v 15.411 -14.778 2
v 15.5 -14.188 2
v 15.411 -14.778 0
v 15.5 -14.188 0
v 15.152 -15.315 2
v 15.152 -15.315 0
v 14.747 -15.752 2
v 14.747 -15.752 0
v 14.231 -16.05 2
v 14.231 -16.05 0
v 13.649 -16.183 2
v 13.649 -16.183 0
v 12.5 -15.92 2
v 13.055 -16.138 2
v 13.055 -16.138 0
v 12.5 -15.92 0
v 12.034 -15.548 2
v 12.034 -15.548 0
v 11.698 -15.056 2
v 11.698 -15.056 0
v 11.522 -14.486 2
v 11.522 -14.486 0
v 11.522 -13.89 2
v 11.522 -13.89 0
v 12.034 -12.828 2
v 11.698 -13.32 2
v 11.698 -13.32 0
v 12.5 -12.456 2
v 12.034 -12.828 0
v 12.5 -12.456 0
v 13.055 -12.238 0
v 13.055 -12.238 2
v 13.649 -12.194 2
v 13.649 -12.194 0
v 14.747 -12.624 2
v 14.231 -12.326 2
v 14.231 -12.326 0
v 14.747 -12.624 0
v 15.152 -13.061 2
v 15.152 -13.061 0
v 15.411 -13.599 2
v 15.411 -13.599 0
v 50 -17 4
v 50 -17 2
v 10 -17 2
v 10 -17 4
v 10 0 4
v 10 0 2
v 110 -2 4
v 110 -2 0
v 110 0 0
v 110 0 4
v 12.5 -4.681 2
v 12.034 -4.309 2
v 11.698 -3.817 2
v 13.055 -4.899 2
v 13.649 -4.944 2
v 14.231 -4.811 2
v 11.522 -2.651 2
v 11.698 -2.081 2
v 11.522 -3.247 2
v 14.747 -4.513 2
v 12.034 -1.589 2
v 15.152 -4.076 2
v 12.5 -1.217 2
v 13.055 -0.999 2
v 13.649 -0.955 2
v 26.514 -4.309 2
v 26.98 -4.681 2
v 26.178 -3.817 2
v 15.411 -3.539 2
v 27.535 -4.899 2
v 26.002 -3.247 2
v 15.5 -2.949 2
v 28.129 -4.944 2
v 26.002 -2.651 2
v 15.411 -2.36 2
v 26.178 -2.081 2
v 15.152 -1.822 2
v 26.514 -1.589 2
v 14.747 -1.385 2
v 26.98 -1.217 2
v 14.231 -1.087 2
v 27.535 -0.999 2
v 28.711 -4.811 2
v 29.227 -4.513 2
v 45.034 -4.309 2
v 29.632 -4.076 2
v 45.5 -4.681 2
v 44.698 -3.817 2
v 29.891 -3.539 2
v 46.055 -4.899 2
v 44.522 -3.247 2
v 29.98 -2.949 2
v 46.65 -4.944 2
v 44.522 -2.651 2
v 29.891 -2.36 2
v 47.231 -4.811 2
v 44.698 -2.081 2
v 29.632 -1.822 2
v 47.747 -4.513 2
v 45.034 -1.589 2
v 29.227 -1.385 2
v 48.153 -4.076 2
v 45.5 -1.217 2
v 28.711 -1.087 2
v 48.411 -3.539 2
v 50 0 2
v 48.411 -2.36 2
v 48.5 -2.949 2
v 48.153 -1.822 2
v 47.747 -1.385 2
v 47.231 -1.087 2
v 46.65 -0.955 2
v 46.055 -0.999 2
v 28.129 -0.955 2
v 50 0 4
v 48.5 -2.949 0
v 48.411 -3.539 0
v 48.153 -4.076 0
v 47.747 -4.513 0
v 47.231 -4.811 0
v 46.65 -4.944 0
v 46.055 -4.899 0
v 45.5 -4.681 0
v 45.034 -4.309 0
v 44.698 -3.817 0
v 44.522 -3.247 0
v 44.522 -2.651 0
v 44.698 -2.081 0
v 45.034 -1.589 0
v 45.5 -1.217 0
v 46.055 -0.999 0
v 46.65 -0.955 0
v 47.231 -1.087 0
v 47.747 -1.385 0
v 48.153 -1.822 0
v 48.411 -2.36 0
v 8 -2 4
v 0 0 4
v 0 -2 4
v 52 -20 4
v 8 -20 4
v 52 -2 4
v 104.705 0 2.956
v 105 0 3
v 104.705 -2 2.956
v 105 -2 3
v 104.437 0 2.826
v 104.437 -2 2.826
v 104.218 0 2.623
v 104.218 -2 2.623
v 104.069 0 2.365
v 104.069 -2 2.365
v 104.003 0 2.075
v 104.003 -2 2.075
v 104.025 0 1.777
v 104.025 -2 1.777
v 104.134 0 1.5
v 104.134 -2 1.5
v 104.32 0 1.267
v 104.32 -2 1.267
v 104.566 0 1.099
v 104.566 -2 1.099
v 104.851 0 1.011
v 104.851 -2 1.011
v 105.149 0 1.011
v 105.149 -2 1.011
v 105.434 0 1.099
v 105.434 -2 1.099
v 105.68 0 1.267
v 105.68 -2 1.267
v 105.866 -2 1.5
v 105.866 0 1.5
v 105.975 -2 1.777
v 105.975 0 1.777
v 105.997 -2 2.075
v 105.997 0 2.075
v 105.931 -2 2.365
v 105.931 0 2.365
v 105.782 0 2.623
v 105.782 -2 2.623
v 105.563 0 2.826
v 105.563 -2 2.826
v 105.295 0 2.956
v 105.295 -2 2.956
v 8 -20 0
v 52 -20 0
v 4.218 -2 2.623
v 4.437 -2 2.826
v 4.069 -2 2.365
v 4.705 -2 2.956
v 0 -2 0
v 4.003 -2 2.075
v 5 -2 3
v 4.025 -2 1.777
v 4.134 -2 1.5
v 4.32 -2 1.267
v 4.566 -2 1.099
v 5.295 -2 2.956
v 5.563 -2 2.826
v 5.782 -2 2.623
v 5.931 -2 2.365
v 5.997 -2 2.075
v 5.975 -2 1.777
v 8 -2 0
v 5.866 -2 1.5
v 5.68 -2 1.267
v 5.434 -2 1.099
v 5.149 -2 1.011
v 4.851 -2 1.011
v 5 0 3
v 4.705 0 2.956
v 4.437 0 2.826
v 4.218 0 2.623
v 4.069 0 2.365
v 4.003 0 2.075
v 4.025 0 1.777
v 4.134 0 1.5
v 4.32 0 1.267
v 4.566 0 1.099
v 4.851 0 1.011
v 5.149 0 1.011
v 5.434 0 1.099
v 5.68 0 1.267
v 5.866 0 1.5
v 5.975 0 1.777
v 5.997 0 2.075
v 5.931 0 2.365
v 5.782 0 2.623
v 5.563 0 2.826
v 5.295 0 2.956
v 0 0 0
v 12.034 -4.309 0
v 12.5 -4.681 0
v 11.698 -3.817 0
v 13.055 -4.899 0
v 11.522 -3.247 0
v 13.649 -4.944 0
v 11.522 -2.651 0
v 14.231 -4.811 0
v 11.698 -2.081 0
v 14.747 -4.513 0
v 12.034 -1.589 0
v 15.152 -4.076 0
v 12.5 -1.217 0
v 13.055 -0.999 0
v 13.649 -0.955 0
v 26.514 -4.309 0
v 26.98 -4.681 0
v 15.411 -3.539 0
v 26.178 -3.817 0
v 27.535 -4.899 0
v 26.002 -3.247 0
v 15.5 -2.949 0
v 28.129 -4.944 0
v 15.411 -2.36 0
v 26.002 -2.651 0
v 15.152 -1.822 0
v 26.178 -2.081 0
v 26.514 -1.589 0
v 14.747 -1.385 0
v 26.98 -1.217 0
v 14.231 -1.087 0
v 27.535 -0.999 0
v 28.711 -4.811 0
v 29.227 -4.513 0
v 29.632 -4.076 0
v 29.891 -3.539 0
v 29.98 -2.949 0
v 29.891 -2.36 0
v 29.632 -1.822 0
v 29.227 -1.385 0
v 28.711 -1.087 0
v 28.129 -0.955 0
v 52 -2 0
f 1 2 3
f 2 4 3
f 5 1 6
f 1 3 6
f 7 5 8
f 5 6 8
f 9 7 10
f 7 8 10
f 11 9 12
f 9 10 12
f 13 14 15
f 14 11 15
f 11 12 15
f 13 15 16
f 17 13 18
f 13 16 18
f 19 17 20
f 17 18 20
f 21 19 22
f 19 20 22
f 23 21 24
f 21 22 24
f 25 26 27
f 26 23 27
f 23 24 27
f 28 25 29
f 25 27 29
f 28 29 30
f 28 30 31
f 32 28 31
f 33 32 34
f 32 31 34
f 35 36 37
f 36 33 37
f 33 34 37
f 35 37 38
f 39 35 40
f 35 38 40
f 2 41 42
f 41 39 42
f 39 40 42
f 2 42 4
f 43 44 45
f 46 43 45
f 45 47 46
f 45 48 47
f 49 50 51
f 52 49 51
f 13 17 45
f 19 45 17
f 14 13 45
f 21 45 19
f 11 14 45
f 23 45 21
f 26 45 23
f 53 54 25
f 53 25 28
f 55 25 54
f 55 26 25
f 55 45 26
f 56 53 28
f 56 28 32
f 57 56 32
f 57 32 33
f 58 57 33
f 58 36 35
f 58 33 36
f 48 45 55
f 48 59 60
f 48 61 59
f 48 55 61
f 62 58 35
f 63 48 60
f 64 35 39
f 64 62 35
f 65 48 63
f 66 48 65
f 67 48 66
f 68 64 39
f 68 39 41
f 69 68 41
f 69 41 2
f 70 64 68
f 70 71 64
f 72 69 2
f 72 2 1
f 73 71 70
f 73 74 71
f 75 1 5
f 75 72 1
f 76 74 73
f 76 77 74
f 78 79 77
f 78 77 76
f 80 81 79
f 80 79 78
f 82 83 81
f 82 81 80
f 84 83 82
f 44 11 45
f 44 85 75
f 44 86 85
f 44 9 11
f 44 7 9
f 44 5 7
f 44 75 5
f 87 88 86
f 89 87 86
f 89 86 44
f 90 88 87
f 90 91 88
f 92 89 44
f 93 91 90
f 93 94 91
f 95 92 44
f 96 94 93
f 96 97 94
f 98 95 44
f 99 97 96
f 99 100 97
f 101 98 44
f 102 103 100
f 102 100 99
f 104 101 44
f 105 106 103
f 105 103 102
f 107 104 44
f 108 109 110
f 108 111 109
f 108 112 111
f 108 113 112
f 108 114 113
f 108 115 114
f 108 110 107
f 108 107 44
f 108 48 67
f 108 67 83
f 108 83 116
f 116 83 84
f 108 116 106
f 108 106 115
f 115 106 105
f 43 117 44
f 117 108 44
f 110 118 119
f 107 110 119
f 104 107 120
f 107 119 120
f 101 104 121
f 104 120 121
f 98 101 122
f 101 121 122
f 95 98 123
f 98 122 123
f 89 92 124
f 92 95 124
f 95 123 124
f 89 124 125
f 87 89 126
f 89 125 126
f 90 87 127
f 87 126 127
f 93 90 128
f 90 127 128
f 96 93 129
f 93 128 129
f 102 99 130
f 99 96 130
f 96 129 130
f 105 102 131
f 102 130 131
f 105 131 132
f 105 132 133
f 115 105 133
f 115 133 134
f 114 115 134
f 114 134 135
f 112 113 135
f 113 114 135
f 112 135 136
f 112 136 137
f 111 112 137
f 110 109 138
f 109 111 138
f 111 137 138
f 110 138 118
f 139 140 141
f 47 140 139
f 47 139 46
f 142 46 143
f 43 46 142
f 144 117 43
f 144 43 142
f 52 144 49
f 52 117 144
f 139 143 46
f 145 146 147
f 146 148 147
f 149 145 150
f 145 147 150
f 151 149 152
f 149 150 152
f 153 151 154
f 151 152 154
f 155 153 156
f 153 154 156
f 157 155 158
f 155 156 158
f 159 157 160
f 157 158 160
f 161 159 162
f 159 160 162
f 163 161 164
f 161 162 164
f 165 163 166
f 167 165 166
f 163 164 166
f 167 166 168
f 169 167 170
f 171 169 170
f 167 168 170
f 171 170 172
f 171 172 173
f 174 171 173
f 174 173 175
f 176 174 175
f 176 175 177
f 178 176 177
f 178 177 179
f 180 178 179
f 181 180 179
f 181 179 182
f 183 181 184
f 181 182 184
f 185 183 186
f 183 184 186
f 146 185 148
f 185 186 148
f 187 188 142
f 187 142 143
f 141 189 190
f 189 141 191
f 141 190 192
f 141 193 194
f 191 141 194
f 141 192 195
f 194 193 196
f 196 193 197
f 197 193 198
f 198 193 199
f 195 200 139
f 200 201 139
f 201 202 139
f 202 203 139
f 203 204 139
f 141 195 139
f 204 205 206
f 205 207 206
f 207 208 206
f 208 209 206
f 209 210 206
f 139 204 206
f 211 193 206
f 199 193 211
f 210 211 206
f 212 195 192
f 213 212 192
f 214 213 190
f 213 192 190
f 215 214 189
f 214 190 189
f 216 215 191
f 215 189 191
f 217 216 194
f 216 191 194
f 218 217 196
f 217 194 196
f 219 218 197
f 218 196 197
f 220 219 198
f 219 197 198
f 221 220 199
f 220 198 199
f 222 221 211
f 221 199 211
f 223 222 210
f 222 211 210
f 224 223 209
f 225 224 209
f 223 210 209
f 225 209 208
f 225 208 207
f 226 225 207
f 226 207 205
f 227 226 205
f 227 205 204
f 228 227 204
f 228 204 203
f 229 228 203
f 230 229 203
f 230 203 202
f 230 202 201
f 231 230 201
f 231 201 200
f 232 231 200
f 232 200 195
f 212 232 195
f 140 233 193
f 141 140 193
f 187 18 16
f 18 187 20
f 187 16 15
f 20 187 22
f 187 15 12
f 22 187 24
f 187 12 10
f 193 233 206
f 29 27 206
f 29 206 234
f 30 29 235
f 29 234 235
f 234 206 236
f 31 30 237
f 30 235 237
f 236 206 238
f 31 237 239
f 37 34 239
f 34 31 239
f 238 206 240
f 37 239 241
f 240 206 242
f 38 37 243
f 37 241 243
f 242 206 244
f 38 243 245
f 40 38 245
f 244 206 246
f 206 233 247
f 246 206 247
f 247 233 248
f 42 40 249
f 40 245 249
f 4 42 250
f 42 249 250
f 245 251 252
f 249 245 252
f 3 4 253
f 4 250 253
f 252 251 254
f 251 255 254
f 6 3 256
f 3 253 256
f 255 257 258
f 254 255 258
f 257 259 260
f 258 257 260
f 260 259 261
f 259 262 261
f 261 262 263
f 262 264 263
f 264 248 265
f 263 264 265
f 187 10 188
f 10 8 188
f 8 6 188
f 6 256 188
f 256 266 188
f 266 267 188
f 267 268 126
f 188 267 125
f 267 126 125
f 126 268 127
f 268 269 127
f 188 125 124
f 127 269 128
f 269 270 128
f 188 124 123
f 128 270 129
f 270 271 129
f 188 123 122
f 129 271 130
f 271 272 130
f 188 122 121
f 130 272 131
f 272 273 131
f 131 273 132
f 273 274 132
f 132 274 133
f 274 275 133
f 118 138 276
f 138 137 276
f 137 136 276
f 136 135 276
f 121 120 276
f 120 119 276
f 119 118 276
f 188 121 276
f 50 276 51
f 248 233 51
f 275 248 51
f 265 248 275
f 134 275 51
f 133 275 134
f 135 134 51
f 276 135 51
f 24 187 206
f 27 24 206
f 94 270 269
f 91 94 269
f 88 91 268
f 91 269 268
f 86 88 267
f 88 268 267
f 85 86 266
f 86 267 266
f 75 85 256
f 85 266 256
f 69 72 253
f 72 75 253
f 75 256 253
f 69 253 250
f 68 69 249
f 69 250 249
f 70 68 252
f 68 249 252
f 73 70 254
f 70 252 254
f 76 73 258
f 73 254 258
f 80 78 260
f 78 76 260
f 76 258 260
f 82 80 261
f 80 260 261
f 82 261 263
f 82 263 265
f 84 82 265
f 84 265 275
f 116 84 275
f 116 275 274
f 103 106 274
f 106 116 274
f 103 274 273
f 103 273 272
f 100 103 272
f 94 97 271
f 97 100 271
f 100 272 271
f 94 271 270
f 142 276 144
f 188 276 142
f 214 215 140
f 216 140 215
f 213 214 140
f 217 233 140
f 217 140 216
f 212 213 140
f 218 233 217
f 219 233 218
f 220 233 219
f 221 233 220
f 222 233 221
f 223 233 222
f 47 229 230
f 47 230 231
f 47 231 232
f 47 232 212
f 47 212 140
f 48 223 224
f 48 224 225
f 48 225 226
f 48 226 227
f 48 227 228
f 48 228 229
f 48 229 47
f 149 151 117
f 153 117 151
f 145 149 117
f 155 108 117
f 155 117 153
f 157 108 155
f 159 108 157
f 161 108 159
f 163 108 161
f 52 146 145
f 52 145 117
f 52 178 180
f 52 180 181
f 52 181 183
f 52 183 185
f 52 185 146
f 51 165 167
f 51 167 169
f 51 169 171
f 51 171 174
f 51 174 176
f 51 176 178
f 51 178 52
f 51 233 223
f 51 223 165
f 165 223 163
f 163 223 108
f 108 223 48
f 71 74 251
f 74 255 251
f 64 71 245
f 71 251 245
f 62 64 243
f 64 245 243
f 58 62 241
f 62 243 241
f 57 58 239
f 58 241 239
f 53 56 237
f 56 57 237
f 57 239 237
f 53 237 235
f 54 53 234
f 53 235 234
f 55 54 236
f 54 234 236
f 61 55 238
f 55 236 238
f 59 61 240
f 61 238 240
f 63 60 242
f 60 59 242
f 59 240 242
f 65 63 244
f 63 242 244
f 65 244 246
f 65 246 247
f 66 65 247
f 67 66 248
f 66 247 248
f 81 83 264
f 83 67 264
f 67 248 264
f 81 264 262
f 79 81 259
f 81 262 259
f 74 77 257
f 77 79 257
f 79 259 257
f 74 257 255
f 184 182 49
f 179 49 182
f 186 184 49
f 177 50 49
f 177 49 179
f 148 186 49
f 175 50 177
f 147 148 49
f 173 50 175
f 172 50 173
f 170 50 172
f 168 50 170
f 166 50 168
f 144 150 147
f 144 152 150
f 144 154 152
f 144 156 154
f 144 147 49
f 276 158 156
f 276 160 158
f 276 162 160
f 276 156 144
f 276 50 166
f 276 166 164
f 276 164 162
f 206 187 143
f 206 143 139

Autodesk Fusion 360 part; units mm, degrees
sketch "Esboço1" plane through (0, 0, 0) normal (0, 0, 1) x (1, 0, 0)
  line L0 (0, 0) -> (110, 0)
  line L1 (110, 0) -> (110, -5)
  line L2 (55, -20) -> (5, -20)
  line L3 (0, -5) -> (0, 0)
  line L4 (0, 0) -> (55, 0)
  line L5 (0, -5) -> (0, 0)
  line L6 (35, 0) -> (75, 0)
  line L7 (0, 0) -> (10, 0)
  line L8 (10, 0) -> (10, -10)
  line L9 (0, -5) -> (0, 0)
  line L10 (10, 0) -> (50, 0)
  line L11 (50, 0) -> (50, -17)
  line L12 (50, -17) -> (10, -17)
  line L13 (10, -17) -> (10, 0)
  line L14 (10, 0) -> (50, 0)
  line L15 (50, 0) -> (50, -17)
  line L16 (50, -17) -> (10, -17)
  line L17 (10, -17) -> (10, 0)
  circle A0 centre (46.5001, -2.9491) radius 2
  circle A1 centre (46.5001, -14.1881) radius 2
  circle A2 centre (30, -14.1881) radius 2
  line L18 (30, -12.1881) -> (30, -17)
  circle A3 centre (13.4999, -14.1881) radius 2
  line L19 (0, 0) -> (5, 0)
  line L20 (0, -5) -> (0, 0)
  line L21 (110, 0) -> (105, 0)
  line L22 (110, -5) -> (110, 0)
  line L23 (55, -20) -> (110, -5)
  line L24 (5, -20) -> (0, -5)
  line L25 (0, 0) -> (5, 0)
  line L26 (5, 0) -> (5, 5)
  line L27 (5, 5) -> (0, 5)
  line L28 (0, 5) -> (0, 0)
  line L29 (105, 0) -> (110, 0)
  line L30 (110, 0) -> (110, 5)
  line L31 (110, 5) -> (105, 5)
  line L32 (105, 5) -> (105, 0)
  dimension "d1" = 110
  dimension "d3" = 55
  dimension "d5" = 40
  dimension "d7" = 40
  dimension "d8" = 17
  dimension "d9" = 40
  dimension "d10" = 17
  dimension "d11" = 4
  dimension "d12" = 4
  dimension "d13" = 4
  dimension "d14" = 5
  dimension "d15" = 5
  dimension "d16" = 5
  dimension "d17" = 5
extrude "Extrusão1" add sketch "Esboço1" along normal blind 2 contours L0 L4 L6 L8 L10 L11 L12 L13 L14 L15 L16 L17
extrude "Extrusão2" add sketch "Esboço1" along normal blind 4 contours L0 L1 L2 L3 L4 L5 L6 L7 L8 L9 L11 L12 L13 L15 L16 L17 L19 L20 L21 L22 L23 L24 L25 L29
extrude "Extrusão3" add sketch "Esboço1" along normal blind 1 contours L0 L21 L29 L30 L31 L32
extrude "Extrusão4" add sketch "Esboço1" along normal blind 1 contours L0 L4 L7 L19 L25 L26 L27 L28
sketch "Esboço2" plane through (0, 5, 0) normal (0, 1, 0) x (-1, 0, 0)
  line L0 (-110, 0) -> (-105, 0)
  line L1 (-105, 0) -> (-105, 1)
  line L2 (-105, 1) -> (-110, 1)
  line L3 (-110, 1) -> (-110, 0)
  circle A0 centre (-105, 2) radius 1
  circle A1 centre (-5, 2) radius 1
  dimension "d26" = 2
hole "Furo1" at (105, 5, 2) direction (0, -1, 0) diameter 2 depth 38 tip angle 118
hole "Furo2" at (5, 5, 2) direction (0, -1, 0) diameter 2 depth 38 tip angle 118
sketch "Esboço3" plane through (0, 0, 0) normal (0, 0, 1) x (1, 0, 0)
  line L0 (0, 0) -> (10, 0)
  line L1 (10, 0) -> (10, -2)
  line L2 (10, -2) -> (0, -2)
  line L3 (0, -2) -> (0, 0)
  line L4 (7, 0) -> (10, 0)
  line L5 (10, 0) -> (10, -20)
  line L6 (10, -20) -> (7, -20)
  line L7 (7, -20) -> (7, 0)
  line L8 (10, -20) -> (7, -20)
  line L9 (7, -20) -> (7, -2)
  line L10 (7, -2) -> (10, -2)
  line L11 (10, -2) -> (10, -20)
  line L12 (7, -20) -> (5, -20)
  line L13 (5, -20) -> (5, -2)
  line L14 (5, -2) -> (7, -2)
  line L15 (7, -2) -> (7, -20)
  dimension "d33" = 2
sketch "Esboço4" plane through (0, 0, 0) normal (0, 0, 1) x (1, 0, 0)
  line L0 (8, 0) -> (10, 0)
  line L1 (10, 0) -> (10, -20)
  line L2 (10, -20) -> (8, -20)
  line L3 (8, -20) -> (8, 0)
  line L4 (10, 0) -> (0, 0)
  line L5 (0, 0) -> (0, -2)
  line L6 (0, -2) -> (10, -2)
  line L7 (10, -2) -> (10, 0)
  line L8 (8, -20) -> (0, -20)
  line L9 (0, -20) -> (0, -2)
  line L10 (0, -2) -> (8, -2)
  line L11 (8, -2) -> (8, -20)
extrude "Extrusão6" cut sketch "Esboço4" along normal blind 2 contours L3 L6 L8 L9 L10 L11
extrude "Extrusão7" cut sketch "Esboço4" along normal blind 4 contours L3 L6 L8 L9 L10 L11
sketch "Esboço5" plane through (0, 0, 0) normal (0, 0, 1) x (1, 0, 0)
  line L0 (52, -20) -> (110, -20)
  line L1 (110, -20) -> (110, -2)
  line L2 (110, -2) -> (52, -2)
  line L3 (52, -2) -> (52, -20)
extrude "Extrusão8" cut sketch "Esboço5" along normal blind 4
extrude "Extrusão9" cut 1 faces at (108.3333, 1.6667, 1) along direction (0, 0, -1) blind 1
extrude "Extrusão10" cut 1 faces at (1.6667, 3.3333, 1) along direction (0, 0, -1) blind 1
sketch "Esboço6" plane through (0, 0, 0) normal (0, 0, 1) x (1, 0, 0)
  circle A0 centre (13.4999, -2.9491) radius 2
  point P0 (13.4999, -14.1881)
  point P1 (46.5001, -2.9491)
  dimension "d46" = 4
extrude "Extrusão14" cut sketch "Esboço6" along normal blind 2
sketch "Esboço7" plane through (0, 0, 0) normal (0, 0, 1) x (1, 0, 0)
  circle A0 centre (27.9799, -2.9491) radius 2
  point P0 (13.4999, -2.9491)
  dimension "d55" = 4
extrude "Extrusão15" cut sketch "Esboço7" along normal blind 2
extrude "Extrusão16" add sketch "Esboço1" along normal blind 2 contours A1 | A2 L18 picked at (28.599, -14.3364)
extrude "Extrusão17" add sketch "Esboço1" along normal blind 2 contours A2 L18 picked at (31.4707, -14.5893)
